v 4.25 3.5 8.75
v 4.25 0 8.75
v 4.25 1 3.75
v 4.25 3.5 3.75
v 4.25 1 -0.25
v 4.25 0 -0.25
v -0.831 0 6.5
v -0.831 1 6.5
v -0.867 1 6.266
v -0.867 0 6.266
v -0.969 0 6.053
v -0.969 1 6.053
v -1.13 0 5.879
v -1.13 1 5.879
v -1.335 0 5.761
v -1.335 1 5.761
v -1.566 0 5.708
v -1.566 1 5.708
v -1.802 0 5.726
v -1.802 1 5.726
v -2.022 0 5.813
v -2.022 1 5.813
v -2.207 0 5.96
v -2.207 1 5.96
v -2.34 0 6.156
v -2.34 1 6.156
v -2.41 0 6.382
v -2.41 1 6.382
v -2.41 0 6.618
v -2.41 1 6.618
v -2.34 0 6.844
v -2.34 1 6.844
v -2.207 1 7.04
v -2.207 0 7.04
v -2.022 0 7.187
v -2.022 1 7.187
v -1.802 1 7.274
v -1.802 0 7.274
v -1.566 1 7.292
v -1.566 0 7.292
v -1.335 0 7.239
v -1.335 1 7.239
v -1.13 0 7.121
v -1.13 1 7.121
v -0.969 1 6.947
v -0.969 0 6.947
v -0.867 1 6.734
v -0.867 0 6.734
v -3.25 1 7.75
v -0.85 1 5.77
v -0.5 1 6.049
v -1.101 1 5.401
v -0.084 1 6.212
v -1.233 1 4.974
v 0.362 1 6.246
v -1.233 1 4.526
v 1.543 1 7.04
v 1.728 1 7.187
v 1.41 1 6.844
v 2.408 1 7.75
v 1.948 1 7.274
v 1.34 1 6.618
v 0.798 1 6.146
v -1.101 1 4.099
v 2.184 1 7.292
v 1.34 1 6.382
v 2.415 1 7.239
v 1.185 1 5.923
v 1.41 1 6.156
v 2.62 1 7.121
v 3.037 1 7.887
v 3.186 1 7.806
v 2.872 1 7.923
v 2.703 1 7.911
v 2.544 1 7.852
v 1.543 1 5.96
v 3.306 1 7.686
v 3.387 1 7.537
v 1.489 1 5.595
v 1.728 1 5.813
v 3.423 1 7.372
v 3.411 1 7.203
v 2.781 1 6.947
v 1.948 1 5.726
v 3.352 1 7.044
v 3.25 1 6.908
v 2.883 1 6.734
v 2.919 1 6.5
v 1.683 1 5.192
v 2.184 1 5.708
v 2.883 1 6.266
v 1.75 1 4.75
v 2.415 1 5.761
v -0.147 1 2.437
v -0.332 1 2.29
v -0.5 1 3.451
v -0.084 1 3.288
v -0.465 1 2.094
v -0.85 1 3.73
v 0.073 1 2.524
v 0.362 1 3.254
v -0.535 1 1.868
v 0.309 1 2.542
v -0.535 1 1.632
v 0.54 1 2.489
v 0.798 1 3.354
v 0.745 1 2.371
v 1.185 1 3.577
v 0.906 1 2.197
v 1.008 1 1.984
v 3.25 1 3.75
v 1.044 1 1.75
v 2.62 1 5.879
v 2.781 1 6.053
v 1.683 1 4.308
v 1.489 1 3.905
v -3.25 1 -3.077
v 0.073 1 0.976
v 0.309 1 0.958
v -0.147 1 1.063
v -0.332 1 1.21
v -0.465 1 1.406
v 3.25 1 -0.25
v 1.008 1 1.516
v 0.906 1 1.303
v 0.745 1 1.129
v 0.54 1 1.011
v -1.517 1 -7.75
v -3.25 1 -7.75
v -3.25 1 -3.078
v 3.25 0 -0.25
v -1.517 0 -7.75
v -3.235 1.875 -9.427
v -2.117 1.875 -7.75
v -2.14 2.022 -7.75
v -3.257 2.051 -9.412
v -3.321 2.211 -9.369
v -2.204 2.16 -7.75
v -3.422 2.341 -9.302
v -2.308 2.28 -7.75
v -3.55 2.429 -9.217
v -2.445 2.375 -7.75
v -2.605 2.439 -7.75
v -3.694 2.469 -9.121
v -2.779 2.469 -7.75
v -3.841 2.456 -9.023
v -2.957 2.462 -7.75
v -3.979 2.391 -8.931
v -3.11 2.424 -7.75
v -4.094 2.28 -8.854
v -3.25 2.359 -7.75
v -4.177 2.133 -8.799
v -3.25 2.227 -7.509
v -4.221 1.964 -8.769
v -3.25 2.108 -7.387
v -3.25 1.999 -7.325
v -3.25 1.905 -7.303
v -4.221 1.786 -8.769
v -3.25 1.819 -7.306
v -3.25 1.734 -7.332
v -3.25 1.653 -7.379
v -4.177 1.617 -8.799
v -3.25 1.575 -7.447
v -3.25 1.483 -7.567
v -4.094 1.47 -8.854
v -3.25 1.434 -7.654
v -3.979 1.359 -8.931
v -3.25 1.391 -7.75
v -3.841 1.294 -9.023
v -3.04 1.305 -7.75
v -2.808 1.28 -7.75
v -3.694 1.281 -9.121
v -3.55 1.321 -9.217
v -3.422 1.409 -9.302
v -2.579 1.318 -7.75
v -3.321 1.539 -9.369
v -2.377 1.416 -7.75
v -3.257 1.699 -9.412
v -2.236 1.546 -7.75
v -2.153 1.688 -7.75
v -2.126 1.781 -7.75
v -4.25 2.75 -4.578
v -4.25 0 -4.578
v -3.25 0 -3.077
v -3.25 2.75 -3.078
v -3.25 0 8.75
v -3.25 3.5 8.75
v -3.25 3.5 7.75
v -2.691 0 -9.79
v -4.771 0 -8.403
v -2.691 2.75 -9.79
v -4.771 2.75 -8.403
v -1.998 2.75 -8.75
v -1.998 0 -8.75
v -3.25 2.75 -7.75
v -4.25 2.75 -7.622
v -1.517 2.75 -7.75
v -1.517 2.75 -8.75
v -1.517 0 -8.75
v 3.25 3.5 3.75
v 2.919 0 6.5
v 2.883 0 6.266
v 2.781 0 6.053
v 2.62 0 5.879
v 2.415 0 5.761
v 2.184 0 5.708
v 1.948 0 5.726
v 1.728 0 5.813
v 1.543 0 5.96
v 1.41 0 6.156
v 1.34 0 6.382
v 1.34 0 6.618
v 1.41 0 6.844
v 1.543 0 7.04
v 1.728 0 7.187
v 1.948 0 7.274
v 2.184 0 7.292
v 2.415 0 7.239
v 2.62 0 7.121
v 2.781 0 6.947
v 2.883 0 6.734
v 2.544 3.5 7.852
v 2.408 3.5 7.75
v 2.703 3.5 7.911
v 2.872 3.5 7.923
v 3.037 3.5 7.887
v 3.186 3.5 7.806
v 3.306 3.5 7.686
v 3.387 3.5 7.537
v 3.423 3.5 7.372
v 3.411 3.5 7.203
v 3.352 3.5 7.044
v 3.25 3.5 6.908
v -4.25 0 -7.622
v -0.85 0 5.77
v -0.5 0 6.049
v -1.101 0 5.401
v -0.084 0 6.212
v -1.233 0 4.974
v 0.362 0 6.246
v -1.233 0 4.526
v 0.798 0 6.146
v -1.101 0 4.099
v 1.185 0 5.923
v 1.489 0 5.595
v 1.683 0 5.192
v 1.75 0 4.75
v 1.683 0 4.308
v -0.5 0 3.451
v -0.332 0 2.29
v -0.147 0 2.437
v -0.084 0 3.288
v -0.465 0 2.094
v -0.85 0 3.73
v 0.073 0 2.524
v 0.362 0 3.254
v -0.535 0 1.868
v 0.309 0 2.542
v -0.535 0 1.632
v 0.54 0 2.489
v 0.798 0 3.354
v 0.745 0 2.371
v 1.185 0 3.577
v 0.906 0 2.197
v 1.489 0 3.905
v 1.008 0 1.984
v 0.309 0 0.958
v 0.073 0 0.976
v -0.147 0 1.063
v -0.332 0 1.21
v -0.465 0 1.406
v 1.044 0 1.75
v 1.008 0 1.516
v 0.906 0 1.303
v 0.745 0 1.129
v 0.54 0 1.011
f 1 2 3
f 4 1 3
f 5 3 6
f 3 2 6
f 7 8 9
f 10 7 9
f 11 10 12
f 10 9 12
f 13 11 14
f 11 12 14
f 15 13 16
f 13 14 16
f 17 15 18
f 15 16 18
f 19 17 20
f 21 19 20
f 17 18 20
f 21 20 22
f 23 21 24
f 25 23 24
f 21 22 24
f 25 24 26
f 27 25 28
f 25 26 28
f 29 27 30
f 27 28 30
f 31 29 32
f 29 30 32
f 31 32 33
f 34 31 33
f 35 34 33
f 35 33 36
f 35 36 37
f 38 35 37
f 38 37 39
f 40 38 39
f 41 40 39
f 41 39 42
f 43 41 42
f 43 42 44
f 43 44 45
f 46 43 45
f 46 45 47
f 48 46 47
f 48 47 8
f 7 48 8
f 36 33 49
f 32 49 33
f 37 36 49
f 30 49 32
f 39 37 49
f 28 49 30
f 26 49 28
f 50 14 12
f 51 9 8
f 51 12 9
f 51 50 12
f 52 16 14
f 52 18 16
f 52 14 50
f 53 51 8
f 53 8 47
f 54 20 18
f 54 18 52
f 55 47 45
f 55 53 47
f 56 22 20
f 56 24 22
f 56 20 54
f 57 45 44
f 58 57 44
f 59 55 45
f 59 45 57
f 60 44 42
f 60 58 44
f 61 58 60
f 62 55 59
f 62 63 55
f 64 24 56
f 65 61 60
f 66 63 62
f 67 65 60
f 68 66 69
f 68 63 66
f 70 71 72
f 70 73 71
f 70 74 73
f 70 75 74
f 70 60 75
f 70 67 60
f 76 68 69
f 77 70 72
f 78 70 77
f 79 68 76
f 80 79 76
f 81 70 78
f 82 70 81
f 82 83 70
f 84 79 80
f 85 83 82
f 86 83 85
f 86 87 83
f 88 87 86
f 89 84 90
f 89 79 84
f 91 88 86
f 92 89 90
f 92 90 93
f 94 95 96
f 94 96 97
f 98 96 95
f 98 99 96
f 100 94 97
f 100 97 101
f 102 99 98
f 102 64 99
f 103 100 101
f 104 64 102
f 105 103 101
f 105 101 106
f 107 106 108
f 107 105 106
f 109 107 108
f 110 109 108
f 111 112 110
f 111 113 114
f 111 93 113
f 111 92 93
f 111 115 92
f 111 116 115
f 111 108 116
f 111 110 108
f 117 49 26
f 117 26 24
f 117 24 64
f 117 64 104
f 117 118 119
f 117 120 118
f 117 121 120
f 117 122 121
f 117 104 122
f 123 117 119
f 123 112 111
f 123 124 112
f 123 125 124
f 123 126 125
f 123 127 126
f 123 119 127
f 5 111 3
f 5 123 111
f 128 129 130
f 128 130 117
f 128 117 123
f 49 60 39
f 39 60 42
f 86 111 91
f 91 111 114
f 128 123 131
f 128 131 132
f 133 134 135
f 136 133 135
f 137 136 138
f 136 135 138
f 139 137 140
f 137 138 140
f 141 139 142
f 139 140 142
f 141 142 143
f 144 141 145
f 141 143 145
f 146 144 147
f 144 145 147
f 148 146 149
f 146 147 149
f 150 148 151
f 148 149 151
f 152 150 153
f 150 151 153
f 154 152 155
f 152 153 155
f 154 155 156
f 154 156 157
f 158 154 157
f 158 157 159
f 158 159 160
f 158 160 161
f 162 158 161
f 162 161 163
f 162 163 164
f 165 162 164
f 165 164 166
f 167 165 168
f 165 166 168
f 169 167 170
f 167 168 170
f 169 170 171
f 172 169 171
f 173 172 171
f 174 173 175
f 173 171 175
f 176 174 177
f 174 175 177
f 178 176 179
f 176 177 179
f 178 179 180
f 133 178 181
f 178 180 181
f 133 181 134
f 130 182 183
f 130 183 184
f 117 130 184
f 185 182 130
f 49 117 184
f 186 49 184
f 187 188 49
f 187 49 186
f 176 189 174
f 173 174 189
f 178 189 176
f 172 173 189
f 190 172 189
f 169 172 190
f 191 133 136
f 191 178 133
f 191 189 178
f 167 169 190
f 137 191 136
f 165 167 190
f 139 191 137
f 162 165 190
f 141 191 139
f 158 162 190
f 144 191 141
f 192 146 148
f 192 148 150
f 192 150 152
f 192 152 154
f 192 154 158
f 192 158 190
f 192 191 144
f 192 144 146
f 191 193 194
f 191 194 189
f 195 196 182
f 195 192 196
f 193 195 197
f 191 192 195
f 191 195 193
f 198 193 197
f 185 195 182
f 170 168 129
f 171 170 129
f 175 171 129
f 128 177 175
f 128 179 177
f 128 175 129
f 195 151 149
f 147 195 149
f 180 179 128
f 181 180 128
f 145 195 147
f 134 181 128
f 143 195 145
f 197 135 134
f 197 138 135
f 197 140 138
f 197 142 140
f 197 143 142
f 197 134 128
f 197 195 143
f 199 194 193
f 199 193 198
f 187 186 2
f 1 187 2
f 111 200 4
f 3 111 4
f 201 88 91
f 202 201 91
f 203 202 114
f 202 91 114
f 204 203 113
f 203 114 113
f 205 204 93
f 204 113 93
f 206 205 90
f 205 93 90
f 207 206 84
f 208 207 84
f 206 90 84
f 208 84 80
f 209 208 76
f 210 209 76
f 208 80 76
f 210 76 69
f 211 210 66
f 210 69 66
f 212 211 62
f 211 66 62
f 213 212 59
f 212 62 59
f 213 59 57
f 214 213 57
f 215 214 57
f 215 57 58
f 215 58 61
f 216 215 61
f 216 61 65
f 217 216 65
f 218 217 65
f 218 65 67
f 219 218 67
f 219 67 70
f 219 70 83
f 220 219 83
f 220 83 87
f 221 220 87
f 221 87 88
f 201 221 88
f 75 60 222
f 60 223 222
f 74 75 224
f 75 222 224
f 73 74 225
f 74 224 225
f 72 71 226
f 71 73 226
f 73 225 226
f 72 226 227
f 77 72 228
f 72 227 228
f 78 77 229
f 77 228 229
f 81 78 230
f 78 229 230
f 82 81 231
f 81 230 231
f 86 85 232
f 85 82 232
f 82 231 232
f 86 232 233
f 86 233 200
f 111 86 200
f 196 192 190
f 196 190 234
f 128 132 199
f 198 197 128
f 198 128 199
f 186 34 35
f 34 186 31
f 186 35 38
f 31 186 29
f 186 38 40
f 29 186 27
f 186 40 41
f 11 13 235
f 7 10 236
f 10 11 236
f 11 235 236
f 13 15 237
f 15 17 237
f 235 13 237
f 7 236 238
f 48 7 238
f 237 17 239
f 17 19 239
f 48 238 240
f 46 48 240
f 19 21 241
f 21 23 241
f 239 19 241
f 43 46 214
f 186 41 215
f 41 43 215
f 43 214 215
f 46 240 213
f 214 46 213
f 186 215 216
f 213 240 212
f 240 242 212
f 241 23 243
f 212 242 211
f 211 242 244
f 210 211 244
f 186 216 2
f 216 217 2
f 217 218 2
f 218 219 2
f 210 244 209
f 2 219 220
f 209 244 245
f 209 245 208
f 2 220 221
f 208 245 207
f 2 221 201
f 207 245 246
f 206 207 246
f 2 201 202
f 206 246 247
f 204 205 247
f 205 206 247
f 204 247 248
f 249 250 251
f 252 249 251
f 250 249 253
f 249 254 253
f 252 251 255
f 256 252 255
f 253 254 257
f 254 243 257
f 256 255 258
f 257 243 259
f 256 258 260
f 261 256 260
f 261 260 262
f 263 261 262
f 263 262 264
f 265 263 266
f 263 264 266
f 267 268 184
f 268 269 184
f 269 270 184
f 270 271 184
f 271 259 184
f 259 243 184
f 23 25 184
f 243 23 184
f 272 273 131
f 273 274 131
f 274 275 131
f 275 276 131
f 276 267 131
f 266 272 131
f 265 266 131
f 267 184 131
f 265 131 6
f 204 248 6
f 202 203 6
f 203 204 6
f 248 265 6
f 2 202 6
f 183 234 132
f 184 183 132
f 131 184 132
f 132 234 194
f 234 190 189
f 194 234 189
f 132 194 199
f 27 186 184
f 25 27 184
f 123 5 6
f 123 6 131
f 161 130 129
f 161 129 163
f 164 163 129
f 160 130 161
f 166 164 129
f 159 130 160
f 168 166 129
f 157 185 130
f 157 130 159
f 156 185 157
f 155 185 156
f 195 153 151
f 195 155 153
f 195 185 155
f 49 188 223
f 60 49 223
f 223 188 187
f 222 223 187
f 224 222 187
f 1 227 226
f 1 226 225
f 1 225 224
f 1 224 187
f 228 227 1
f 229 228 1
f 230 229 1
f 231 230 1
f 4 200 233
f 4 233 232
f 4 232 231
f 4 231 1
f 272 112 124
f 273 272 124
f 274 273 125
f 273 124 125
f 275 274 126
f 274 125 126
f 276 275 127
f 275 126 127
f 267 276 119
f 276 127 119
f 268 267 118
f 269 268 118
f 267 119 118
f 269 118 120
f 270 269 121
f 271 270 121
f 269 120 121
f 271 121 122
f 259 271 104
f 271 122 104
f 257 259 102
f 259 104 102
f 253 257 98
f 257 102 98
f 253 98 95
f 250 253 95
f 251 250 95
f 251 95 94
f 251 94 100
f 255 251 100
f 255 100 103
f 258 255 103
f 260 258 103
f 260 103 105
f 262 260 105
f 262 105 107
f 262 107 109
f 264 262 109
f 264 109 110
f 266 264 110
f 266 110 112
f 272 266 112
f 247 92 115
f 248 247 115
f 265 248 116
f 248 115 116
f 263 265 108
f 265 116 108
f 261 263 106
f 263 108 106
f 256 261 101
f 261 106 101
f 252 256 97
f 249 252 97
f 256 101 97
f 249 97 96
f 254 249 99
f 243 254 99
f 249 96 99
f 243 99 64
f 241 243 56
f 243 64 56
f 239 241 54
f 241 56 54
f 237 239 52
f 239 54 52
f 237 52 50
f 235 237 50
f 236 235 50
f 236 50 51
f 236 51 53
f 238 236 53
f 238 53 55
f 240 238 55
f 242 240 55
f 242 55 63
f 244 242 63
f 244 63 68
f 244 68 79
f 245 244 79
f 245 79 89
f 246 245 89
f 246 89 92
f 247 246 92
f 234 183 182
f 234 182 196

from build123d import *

# Parameters (mm, degrees)
SKETCH1_W                     = 8.5
SKETCH1_H                     = 17.5
BOSS_EXTRUDE1_DEPTH           = 3.5
SKETCH2_W                     = 6.5
SKETCH2_H                     = 15.5
CUT_EXTRUDE1_DEPTH            = 2.5
SKETCH3_R                     = 1.5
CUT_EXTRUDE2_DEPTH            = 2
SKETCH6_R                     = 0.5953125
CUT_EXTRUDE5_DEPTH            = 2.5
SKETCH7_R                     = 0.79375
CUT_EXTRUDE6_DEPTH            = 2
BOSS_EXTRUDE2_DEPTH           = 3.5
SKETCH14_W                    = 6.011083366
SKETCH14_H                    = 10.896717754
CUT_EXTRUDE8_DEPTH            = 0.75
TAP_DRILL_FOR_0_80_TAP1_D     = 1.19126
TAP_DRILL_FOR_0_80_TAP1_DEPTH = 7.11
TAP_DRILL_FOR_0_80_TAP1_TIP   = 0.357890611
CUT_EXTRUDE7_REACH            = 5.5
SKETCH15_W                    = 1
SKETCH15_H                    = 4
CUT_EXTRUDE9_DEPTH            = 2.5


with BuildPart() as part:
    # Sketch1 → Boss-Extrude1 (new body)
    with BuildSketch(Plane(origin=(0, 0, 0), x_dir=(1, 0, 0), z_dir=(0, 1, 0))):
        Rectangle(SKETCH1_W, SKETCH1_H)
    extrude(amount=BOSS_EXTRUDE1_DEPTH)

    # Sketch2 → Cut-Extrude1 (cut)
    with BuildSketch(Plane(origin=(0, 3.5, 0), x_dir=(1, 0, 0), z_dir=(0, 1, 0))):
        Rectangle(SKETCH2_W, SKETCH2_H)
    extrude(amount=-CUT_EXTRUDE1_DEPTH, mode=Mode.SUBTRACT)

    # Sketch3 → Cut-Extrude2 (cut, through all)
    with BuildSketch(Plane(origin=(0, 1, 0), x_dir=(1, 0, 0), z_dir=(0, 1, 0))):
        with Locations((0.25, -4.75)):
            Circle(SKETCH3_R)
    extrude(amount=-CUT_EXTRUDE2_DEPTH, mode=Mode.SUBTRACT)

    # Sketch6 → Cut-Extrude5 (cut)
    with BuildSketch(Plane(origin=(0, 3.5, 0), x_dir=(1, 0, 0), z_dir=(0, 1, 0))):
        with Locations((2.829050494, -7.329050494)):
            Circle(SKETCH6_R)
    extrude(amount=-CUT_EXTRUDE5_DEPTH, mode=Mode.SUBTRACT)

    # Sketch7 → Cut-Extrude6 (cut, through all)
    with BuildSketch(Plane(origin=(0, 1, 0), x_dir=(1, 0, 0), z_dir=(0, 1, 0))):
        with Locations((0.25, -1.75)):
            Circle(SKETCH7_R)
        with Locations((-1.625, -6.5)):
            Circle(SKETCH7_R)
        with Locations((2.125, -6.5)):
            Circle(SKETCH7_R)
    extrude(amount=-CUT_EXTRUDE6_DEPTH, mode=Mode.SUBTRACT)

    # Sketch9 → Boss-Extrude2 (add)
    with BuildSketch(Plane(origin=(0, 3.5, 0), x_dir=(1, 0, 0), z_dir=(0, 1, 0))):
        Polygon((-2.69064642, 9.789569053), (-4.770772156, 8.402818562), (-4.001541387, 7.248972409), (-3.411634369, 7.642243754), (-2.511322669, 8.242451554), (-1.921415651, 8.635722899), align=None)
    extrude(amount=-BOSS_EXTRUDE2_DEPTH)

    # Sketch14 → Cut-Extrude8 (cut)
    with BuildSketch(Plane(origin=(0, 3.5, 0), x_dir=(1, 0, 0), z_dir=(0, 1, 0))):
        with Locations((-3.25, 7.75)):
            Rectangle(SKETCH14_W, SKETCH14_H)
    extrude(amount=-CUT_EXTRUDE8_DEPTH, mode=Mode.SUBTRACT)

    # Tap Drill for #0-80 Tap1
    with Locations(Plane(origin=(-5.346153846, 0, -8.019230769), x_dir=(-0.832050294, 0, 0.554700196), z_dir=(-0.554700196, 0, -0.832050294))):
        with Locations((-1.941522729, 1.875)):
            Hole(TAP_DRILL_FOR_0_80_TAP1_D / 2, depth=TAP_DRILL_FOR_0_80_TAP1_DEPTH)
            with Locations((0, 0, -(TAP_DRILL_FOR_0_80_TAP1_DEPTH + TAP_DRILL_FOR_0_80_TAP1_TIP / 2))):  # 118° drill point
                Cone(0, TAP_DRILL_FOR_0_80_TAP1_D / 2, TAP_DRILL_FOR_0_80_TAP1_TIP, mode=Mode.SUBTRACT)

    # Sketch13 → Cut-Extrude7 (cut, up to next)
    with BuildSketch(Plane(origin=(0, 3.5, 0), x_dir=(1, 0, 0), z_dir=(0, 1, 0)), mode=Mode.PRIVATE) as cut_extrude7_sk1:
        Polygon((-3.249629447, -8.75), (-4.25, -8.75), (-4.25, 4.577582981), (-3.249629447, 3.077027151), align=None)
    cut_extrude7_tool1 = extrude(cut_extrude7_sk1.sketch, amount=-CUT_EXTRUDE7_REACH, mode=Mode.PRIVATE) & part.part
    add(cut_extrude7_tool1.solids().sort_by_distance((-3.759761, 3.5, 2.453888))[0], mode=Mode.SUBTRACT)
    # Sketch13 → Cut-Extrude7 (cut, up to next)
    with BuildSketch(Plane(origin=(0, 3.5, 0), x_dir=(1, 0, 0), z_dir=(0, 1, 0)), mode=Mode.PRIVATE) as cut_extrude7_sk2:
        Polygon((3.25, 0.25), (-1.517086772, 7.75), (-1.517086772, 8.75), (4.25, 8.75), (4.25, 0.25), align=None)
    cut_extrude7_tool2 = extrude(cut_extrude7_sk2.sketch, amount=-CUT_EXTRUDE7_REACH, mode=Mode.PRIVATE) & part.part
    add(cut_extrude7_tool2.solids().sort_by_distance((2.109513, 3.5, -5.504506))[0], mode=Mode.SUBTRACT)

    # Sketch15 → Cut-Extrude9 (cut)
    with BuildSketch(Plane(origin=(0, 3.5, 0), x_dir=(1, 0, 0), z_dir=(0, 1, 0))):
        with Locations((3.75, -1.75)):
            Rectangle(SKETCH15_W, SKETCH15_H)
    extrude(amount=-CUT_EXTRUDE9_DEPTH, mode=Mode.SUBTRACT)


solid = part.part
